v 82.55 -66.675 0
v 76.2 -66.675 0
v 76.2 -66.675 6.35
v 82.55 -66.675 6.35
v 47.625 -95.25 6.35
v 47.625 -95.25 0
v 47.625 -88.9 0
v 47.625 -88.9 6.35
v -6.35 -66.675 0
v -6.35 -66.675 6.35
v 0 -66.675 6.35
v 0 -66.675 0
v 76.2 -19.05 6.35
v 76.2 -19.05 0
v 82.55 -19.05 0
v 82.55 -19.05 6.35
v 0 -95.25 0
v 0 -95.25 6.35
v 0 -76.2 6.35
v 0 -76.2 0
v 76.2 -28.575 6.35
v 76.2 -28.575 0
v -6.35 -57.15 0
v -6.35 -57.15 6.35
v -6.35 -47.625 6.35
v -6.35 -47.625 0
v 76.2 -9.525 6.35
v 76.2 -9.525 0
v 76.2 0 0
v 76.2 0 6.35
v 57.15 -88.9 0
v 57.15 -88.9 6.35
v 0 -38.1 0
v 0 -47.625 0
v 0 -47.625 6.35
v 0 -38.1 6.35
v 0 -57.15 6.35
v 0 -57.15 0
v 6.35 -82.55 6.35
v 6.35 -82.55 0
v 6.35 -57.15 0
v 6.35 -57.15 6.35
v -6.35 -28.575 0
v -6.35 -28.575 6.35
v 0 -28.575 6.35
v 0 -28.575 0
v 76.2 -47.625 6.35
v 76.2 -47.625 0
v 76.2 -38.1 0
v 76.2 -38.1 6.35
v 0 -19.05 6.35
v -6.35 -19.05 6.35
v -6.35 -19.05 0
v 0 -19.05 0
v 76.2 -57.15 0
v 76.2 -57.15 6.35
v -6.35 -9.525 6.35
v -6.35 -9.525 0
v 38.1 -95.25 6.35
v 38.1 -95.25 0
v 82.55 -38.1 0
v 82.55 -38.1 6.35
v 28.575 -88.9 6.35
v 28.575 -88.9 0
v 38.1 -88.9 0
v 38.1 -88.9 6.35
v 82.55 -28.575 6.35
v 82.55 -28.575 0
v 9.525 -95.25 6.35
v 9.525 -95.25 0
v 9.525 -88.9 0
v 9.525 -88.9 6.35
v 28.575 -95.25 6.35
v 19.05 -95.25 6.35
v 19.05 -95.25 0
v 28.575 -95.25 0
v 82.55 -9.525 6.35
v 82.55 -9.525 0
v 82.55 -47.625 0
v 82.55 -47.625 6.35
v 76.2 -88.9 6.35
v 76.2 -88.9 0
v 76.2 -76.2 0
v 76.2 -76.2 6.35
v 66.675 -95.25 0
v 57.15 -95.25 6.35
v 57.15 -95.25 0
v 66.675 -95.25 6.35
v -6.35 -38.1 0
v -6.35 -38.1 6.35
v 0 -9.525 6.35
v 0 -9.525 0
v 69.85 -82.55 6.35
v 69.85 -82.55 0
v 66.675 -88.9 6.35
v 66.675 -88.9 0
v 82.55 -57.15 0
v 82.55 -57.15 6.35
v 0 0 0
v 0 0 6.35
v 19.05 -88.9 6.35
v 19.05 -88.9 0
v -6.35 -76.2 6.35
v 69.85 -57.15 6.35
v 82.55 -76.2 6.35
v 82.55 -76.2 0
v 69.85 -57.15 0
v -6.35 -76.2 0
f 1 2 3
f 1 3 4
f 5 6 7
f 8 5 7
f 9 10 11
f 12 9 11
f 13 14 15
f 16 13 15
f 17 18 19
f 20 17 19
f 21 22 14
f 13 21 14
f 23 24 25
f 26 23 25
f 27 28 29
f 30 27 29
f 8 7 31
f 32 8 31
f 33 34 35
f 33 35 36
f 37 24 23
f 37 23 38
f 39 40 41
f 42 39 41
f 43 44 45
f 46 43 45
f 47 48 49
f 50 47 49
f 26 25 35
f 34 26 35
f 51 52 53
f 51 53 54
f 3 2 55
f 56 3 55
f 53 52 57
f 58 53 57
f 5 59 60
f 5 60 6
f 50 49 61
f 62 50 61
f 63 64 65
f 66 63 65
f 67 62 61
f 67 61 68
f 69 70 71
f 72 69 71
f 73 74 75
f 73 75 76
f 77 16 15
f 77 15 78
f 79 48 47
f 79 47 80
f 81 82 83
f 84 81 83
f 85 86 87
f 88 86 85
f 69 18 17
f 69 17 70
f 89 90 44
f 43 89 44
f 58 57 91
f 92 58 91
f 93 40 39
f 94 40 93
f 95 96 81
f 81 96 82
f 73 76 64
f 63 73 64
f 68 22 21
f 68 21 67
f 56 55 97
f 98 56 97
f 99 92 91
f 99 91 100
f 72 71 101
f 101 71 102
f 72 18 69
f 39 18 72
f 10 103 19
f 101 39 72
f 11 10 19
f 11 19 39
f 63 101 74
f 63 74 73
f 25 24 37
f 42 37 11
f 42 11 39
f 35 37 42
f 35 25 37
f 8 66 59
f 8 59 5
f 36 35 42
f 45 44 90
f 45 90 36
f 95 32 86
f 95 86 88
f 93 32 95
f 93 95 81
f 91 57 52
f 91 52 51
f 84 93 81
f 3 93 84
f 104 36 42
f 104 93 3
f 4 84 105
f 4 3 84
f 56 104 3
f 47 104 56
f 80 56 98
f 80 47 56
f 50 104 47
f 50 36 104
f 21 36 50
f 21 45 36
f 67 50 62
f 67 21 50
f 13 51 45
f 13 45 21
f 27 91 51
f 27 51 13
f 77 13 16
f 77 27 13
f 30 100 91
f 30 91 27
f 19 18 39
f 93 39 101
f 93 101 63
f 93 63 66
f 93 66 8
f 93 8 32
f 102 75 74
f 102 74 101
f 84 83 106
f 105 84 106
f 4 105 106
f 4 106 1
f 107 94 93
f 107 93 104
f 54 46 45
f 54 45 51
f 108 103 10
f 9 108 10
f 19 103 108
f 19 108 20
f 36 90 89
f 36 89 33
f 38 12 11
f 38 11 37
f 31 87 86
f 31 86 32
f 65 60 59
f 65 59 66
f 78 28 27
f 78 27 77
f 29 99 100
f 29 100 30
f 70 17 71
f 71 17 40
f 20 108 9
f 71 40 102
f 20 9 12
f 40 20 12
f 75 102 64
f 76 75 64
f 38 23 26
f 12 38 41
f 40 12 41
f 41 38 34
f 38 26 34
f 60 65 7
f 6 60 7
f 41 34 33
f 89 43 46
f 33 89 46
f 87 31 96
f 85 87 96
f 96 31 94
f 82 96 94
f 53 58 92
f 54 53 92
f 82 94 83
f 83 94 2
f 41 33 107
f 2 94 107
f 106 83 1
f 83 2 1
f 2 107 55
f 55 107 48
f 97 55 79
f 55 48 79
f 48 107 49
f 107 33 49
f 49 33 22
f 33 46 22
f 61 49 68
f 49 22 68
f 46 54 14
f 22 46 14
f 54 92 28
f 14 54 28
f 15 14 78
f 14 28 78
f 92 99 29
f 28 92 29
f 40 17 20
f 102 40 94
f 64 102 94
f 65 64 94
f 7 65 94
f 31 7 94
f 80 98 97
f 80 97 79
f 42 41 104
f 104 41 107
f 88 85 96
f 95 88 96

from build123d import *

# Parameters (mm, degrees)
SKETCH1_W           = 76.2
SKETCH1_H           = 88.9
SKETCH1_W_2         = 63.5
SKETCH1_H_2         = 25.4
BOSS_EXTRUDE1_DEPTH = 6.35
SKETCH2_W           = 6.35
SKETCH2_H           = 9.525
SKETCH2_W_2         = 9.525
SKETCH2_H_2         = 6.35
BOSS_EXTRUDE3_DEPTH = 6.35


with BuildPart() as part:
    # Sketch1 → Boss-Extrude1 (new body)
    with BuildSketch(Plane.XY):
        with Locations((38.1, -44.45)):
            Rectangle(SKETCH1_W, SKETCH1_H)
        with Locations((38.1, -69.85)):
            Rectangle(SKETCH1_W_2, SKETCH1_H_2, mode=Mode.SUBTRACT)
    extrude(amount=BOSS_EXTRUDE1_DEPTH)

    # Sketch2 → Boss-Extrude3 (add)
    with BuildSketch(Plane.XY.offset(6.35)):
        with Locations((-3.175, -14.2875)):
            Rectangle(SKETCH2_W, SKETCH2_H)
        with Locations((-3.175, -33.3375)):
            Rectangle(SKETCH2_W, SKETCH2_H)
        with Locations((-3.175, -52.3875)):
            Rectangle(SKETCH2_W, SKETCH2_H)
        with Locations((-3.175, -71.4375)):
            Rectangle(SKETCH2_W, SKETCH2_H)
        with Locations((4.7625, -92.075)):
            Rectangle(SKETCH2_W_2, SKETCH2_H_2)
        with Locations((23.8125, -92.075)):
            Rectangle(SKETCH2_W_2, SKETCH2_H_2)
        with Locations((79.375, -71.4375)):
            Rectangle(SKETCH2_W, SKETCH2_H)
        with Locations((79.375, -52.3875)):
            Rectangle(SKETCH2_W, SKETCH2_H)
        with Locations((79.375, -33.3375)):
            Rectangle(SKETCH2_W, SKETCH2_H)
        with Locations((79.375, -14.2875)):
            Rectangle(SKETCH2_W, SKETCH2_H)
        with Locations((42.8625, -92.075)):
            Rectangle(SKETCH2_W_2, SKETCH2_H_2)
        with Locations((61.9125, -92.075)):
            Rectangle(SKETCH2_W_2, SKETCH2_H_2)
    extrude(amount=-BOSS_EXTRUDE3_DEPTH)


solid = part.part
